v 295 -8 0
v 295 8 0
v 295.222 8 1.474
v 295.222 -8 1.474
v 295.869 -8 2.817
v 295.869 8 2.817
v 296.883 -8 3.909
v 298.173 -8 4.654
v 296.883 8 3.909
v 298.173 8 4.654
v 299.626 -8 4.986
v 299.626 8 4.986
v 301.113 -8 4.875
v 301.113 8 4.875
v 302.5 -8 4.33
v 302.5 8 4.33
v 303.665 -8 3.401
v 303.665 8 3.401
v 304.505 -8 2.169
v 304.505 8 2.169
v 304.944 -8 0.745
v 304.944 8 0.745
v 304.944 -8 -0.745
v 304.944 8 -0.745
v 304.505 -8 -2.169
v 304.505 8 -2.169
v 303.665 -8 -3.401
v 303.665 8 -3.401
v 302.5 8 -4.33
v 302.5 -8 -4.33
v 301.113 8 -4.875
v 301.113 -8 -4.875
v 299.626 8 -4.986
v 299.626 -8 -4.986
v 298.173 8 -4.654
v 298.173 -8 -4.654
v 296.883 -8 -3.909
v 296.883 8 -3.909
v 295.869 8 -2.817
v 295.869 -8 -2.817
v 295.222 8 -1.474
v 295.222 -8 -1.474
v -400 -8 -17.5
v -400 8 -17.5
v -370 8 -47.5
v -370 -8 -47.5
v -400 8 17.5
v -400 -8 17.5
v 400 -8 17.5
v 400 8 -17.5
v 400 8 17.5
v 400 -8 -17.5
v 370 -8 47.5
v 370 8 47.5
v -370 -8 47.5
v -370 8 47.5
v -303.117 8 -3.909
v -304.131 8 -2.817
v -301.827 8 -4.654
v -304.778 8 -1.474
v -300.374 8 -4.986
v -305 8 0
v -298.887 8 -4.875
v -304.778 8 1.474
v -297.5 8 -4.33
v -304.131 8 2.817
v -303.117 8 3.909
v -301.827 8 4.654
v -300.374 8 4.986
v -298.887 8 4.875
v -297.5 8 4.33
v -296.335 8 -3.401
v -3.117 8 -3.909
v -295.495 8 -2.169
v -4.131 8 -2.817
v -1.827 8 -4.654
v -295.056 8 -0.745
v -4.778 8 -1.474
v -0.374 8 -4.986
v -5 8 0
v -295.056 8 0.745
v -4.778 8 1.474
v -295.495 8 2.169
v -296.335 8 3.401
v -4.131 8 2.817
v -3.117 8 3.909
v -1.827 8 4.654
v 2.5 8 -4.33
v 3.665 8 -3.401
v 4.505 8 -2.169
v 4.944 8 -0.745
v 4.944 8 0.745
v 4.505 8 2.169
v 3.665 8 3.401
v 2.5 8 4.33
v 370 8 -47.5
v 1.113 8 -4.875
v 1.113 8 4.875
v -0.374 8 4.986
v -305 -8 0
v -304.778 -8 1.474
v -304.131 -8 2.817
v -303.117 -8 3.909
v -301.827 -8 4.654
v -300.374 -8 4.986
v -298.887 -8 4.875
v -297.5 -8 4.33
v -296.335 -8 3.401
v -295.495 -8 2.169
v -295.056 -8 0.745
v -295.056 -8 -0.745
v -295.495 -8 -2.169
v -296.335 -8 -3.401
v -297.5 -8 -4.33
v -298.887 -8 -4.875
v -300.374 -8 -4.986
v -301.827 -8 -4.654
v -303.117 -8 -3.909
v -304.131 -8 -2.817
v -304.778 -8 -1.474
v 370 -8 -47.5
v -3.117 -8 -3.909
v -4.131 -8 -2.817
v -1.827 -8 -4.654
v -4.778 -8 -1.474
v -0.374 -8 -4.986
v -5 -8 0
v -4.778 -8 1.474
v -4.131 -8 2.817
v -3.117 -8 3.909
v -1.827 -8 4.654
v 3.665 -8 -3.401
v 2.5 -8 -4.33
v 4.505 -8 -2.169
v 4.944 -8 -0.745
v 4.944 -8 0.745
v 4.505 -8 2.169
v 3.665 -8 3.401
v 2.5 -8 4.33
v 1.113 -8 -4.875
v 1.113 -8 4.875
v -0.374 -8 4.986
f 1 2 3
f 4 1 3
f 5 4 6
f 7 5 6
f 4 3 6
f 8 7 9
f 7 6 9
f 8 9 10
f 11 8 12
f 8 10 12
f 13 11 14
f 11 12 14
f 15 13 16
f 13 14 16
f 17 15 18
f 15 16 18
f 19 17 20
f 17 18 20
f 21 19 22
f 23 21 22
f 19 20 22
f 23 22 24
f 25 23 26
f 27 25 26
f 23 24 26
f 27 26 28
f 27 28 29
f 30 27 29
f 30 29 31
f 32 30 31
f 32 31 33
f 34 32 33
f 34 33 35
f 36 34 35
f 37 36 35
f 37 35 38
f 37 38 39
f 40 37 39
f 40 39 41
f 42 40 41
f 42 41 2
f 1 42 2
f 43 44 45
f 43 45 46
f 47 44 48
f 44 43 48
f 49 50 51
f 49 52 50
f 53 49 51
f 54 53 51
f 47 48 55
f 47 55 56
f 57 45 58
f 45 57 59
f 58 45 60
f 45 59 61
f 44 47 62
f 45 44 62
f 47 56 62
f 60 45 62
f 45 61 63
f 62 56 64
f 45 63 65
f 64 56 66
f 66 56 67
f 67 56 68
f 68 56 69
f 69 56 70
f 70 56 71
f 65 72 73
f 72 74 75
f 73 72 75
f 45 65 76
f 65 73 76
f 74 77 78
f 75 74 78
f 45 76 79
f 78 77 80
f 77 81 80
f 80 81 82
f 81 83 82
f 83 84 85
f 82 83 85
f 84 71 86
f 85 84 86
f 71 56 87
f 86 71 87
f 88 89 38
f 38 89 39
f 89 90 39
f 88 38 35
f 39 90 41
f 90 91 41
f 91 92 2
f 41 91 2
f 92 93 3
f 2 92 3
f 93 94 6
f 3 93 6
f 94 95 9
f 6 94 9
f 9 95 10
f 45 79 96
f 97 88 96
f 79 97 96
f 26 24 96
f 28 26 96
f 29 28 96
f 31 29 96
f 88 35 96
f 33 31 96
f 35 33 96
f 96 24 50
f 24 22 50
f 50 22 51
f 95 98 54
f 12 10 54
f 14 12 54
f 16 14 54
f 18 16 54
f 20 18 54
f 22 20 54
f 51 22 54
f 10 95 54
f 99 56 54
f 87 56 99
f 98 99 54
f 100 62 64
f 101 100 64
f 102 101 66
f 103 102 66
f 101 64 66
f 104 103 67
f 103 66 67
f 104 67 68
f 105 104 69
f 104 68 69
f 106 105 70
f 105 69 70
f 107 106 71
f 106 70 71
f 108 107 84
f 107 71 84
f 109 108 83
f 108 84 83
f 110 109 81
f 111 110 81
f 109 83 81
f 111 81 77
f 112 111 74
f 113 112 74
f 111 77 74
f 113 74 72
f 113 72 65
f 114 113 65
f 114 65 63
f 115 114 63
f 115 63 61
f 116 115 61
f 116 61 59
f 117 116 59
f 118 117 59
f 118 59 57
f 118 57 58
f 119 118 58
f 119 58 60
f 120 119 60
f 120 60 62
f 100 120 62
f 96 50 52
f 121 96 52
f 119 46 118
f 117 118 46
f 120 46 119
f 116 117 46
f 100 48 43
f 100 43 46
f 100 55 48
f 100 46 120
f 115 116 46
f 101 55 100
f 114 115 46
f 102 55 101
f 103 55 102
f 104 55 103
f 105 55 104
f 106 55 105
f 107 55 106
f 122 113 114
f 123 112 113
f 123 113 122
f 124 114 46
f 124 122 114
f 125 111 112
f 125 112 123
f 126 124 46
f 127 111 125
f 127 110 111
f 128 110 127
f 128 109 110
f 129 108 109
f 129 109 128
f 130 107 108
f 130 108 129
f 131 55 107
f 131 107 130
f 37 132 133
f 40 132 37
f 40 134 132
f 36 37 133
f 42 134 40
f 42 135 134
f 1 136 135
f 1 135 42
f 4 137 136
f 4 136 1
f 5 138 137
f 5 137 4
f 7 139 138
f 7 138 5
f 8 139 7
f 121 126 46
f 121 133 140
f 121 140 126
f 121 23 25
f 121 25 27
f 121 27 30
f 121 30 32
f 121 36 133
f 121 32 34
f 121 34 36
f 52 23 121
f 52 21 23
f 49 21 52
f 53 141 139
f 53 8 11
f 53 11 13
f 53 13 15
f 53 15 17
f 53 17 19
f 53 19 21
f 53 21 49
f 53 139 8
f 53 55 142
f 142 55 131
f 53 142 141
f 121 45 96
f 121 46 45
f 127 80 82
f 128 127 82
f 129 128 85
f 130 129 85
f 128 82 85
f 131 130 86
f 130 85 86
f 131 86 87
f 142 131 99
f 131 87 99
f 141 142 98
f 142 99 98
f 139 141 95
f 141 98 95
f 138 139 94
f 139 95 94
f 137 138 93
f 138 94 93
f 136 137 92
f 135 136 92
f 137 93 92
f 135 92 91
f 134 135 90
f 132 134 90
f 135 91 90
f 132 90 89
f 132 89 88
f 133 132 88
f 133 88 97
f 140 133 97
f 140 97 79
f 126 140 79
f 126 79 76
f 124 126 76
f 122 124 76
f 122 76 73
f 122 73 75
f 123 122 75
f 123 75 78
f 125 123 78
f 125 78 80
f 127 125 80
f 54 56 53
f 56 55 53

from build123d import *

# Parameters (mm, degrees)
F0_W     = 800
F0_H     = 95
F1_DEPTH = 8
F2_SIZE  = 30
F4_D     = 10


with BuildPart() as f1:
    # F0 (on Front) → F1 (new body, symmetric)
    with BuildSketch(Plane.XZ):
        Rectangle(F0_W, F0_H)
    extrude(amount=F1_DEPTH, both=True)

    # F2
    f2_edges = [f1.edges().sort_by_distance(p)[0] for p in [
        (-400, 0, -47.5),
        (-400, 0, 47.5),
        (400, 0, -47.5),
        (400, 0, 47.5),
    ]]
    chamfer(f2_edges, length=F2_SIZE)

    # F4 (through all)
    with Locations(Plane.XZ.offset(8)):
        with Locations((0, 0), (300, 0), (-300, 0)):
            Hole(F4_D / 2)


solid = f1.part
